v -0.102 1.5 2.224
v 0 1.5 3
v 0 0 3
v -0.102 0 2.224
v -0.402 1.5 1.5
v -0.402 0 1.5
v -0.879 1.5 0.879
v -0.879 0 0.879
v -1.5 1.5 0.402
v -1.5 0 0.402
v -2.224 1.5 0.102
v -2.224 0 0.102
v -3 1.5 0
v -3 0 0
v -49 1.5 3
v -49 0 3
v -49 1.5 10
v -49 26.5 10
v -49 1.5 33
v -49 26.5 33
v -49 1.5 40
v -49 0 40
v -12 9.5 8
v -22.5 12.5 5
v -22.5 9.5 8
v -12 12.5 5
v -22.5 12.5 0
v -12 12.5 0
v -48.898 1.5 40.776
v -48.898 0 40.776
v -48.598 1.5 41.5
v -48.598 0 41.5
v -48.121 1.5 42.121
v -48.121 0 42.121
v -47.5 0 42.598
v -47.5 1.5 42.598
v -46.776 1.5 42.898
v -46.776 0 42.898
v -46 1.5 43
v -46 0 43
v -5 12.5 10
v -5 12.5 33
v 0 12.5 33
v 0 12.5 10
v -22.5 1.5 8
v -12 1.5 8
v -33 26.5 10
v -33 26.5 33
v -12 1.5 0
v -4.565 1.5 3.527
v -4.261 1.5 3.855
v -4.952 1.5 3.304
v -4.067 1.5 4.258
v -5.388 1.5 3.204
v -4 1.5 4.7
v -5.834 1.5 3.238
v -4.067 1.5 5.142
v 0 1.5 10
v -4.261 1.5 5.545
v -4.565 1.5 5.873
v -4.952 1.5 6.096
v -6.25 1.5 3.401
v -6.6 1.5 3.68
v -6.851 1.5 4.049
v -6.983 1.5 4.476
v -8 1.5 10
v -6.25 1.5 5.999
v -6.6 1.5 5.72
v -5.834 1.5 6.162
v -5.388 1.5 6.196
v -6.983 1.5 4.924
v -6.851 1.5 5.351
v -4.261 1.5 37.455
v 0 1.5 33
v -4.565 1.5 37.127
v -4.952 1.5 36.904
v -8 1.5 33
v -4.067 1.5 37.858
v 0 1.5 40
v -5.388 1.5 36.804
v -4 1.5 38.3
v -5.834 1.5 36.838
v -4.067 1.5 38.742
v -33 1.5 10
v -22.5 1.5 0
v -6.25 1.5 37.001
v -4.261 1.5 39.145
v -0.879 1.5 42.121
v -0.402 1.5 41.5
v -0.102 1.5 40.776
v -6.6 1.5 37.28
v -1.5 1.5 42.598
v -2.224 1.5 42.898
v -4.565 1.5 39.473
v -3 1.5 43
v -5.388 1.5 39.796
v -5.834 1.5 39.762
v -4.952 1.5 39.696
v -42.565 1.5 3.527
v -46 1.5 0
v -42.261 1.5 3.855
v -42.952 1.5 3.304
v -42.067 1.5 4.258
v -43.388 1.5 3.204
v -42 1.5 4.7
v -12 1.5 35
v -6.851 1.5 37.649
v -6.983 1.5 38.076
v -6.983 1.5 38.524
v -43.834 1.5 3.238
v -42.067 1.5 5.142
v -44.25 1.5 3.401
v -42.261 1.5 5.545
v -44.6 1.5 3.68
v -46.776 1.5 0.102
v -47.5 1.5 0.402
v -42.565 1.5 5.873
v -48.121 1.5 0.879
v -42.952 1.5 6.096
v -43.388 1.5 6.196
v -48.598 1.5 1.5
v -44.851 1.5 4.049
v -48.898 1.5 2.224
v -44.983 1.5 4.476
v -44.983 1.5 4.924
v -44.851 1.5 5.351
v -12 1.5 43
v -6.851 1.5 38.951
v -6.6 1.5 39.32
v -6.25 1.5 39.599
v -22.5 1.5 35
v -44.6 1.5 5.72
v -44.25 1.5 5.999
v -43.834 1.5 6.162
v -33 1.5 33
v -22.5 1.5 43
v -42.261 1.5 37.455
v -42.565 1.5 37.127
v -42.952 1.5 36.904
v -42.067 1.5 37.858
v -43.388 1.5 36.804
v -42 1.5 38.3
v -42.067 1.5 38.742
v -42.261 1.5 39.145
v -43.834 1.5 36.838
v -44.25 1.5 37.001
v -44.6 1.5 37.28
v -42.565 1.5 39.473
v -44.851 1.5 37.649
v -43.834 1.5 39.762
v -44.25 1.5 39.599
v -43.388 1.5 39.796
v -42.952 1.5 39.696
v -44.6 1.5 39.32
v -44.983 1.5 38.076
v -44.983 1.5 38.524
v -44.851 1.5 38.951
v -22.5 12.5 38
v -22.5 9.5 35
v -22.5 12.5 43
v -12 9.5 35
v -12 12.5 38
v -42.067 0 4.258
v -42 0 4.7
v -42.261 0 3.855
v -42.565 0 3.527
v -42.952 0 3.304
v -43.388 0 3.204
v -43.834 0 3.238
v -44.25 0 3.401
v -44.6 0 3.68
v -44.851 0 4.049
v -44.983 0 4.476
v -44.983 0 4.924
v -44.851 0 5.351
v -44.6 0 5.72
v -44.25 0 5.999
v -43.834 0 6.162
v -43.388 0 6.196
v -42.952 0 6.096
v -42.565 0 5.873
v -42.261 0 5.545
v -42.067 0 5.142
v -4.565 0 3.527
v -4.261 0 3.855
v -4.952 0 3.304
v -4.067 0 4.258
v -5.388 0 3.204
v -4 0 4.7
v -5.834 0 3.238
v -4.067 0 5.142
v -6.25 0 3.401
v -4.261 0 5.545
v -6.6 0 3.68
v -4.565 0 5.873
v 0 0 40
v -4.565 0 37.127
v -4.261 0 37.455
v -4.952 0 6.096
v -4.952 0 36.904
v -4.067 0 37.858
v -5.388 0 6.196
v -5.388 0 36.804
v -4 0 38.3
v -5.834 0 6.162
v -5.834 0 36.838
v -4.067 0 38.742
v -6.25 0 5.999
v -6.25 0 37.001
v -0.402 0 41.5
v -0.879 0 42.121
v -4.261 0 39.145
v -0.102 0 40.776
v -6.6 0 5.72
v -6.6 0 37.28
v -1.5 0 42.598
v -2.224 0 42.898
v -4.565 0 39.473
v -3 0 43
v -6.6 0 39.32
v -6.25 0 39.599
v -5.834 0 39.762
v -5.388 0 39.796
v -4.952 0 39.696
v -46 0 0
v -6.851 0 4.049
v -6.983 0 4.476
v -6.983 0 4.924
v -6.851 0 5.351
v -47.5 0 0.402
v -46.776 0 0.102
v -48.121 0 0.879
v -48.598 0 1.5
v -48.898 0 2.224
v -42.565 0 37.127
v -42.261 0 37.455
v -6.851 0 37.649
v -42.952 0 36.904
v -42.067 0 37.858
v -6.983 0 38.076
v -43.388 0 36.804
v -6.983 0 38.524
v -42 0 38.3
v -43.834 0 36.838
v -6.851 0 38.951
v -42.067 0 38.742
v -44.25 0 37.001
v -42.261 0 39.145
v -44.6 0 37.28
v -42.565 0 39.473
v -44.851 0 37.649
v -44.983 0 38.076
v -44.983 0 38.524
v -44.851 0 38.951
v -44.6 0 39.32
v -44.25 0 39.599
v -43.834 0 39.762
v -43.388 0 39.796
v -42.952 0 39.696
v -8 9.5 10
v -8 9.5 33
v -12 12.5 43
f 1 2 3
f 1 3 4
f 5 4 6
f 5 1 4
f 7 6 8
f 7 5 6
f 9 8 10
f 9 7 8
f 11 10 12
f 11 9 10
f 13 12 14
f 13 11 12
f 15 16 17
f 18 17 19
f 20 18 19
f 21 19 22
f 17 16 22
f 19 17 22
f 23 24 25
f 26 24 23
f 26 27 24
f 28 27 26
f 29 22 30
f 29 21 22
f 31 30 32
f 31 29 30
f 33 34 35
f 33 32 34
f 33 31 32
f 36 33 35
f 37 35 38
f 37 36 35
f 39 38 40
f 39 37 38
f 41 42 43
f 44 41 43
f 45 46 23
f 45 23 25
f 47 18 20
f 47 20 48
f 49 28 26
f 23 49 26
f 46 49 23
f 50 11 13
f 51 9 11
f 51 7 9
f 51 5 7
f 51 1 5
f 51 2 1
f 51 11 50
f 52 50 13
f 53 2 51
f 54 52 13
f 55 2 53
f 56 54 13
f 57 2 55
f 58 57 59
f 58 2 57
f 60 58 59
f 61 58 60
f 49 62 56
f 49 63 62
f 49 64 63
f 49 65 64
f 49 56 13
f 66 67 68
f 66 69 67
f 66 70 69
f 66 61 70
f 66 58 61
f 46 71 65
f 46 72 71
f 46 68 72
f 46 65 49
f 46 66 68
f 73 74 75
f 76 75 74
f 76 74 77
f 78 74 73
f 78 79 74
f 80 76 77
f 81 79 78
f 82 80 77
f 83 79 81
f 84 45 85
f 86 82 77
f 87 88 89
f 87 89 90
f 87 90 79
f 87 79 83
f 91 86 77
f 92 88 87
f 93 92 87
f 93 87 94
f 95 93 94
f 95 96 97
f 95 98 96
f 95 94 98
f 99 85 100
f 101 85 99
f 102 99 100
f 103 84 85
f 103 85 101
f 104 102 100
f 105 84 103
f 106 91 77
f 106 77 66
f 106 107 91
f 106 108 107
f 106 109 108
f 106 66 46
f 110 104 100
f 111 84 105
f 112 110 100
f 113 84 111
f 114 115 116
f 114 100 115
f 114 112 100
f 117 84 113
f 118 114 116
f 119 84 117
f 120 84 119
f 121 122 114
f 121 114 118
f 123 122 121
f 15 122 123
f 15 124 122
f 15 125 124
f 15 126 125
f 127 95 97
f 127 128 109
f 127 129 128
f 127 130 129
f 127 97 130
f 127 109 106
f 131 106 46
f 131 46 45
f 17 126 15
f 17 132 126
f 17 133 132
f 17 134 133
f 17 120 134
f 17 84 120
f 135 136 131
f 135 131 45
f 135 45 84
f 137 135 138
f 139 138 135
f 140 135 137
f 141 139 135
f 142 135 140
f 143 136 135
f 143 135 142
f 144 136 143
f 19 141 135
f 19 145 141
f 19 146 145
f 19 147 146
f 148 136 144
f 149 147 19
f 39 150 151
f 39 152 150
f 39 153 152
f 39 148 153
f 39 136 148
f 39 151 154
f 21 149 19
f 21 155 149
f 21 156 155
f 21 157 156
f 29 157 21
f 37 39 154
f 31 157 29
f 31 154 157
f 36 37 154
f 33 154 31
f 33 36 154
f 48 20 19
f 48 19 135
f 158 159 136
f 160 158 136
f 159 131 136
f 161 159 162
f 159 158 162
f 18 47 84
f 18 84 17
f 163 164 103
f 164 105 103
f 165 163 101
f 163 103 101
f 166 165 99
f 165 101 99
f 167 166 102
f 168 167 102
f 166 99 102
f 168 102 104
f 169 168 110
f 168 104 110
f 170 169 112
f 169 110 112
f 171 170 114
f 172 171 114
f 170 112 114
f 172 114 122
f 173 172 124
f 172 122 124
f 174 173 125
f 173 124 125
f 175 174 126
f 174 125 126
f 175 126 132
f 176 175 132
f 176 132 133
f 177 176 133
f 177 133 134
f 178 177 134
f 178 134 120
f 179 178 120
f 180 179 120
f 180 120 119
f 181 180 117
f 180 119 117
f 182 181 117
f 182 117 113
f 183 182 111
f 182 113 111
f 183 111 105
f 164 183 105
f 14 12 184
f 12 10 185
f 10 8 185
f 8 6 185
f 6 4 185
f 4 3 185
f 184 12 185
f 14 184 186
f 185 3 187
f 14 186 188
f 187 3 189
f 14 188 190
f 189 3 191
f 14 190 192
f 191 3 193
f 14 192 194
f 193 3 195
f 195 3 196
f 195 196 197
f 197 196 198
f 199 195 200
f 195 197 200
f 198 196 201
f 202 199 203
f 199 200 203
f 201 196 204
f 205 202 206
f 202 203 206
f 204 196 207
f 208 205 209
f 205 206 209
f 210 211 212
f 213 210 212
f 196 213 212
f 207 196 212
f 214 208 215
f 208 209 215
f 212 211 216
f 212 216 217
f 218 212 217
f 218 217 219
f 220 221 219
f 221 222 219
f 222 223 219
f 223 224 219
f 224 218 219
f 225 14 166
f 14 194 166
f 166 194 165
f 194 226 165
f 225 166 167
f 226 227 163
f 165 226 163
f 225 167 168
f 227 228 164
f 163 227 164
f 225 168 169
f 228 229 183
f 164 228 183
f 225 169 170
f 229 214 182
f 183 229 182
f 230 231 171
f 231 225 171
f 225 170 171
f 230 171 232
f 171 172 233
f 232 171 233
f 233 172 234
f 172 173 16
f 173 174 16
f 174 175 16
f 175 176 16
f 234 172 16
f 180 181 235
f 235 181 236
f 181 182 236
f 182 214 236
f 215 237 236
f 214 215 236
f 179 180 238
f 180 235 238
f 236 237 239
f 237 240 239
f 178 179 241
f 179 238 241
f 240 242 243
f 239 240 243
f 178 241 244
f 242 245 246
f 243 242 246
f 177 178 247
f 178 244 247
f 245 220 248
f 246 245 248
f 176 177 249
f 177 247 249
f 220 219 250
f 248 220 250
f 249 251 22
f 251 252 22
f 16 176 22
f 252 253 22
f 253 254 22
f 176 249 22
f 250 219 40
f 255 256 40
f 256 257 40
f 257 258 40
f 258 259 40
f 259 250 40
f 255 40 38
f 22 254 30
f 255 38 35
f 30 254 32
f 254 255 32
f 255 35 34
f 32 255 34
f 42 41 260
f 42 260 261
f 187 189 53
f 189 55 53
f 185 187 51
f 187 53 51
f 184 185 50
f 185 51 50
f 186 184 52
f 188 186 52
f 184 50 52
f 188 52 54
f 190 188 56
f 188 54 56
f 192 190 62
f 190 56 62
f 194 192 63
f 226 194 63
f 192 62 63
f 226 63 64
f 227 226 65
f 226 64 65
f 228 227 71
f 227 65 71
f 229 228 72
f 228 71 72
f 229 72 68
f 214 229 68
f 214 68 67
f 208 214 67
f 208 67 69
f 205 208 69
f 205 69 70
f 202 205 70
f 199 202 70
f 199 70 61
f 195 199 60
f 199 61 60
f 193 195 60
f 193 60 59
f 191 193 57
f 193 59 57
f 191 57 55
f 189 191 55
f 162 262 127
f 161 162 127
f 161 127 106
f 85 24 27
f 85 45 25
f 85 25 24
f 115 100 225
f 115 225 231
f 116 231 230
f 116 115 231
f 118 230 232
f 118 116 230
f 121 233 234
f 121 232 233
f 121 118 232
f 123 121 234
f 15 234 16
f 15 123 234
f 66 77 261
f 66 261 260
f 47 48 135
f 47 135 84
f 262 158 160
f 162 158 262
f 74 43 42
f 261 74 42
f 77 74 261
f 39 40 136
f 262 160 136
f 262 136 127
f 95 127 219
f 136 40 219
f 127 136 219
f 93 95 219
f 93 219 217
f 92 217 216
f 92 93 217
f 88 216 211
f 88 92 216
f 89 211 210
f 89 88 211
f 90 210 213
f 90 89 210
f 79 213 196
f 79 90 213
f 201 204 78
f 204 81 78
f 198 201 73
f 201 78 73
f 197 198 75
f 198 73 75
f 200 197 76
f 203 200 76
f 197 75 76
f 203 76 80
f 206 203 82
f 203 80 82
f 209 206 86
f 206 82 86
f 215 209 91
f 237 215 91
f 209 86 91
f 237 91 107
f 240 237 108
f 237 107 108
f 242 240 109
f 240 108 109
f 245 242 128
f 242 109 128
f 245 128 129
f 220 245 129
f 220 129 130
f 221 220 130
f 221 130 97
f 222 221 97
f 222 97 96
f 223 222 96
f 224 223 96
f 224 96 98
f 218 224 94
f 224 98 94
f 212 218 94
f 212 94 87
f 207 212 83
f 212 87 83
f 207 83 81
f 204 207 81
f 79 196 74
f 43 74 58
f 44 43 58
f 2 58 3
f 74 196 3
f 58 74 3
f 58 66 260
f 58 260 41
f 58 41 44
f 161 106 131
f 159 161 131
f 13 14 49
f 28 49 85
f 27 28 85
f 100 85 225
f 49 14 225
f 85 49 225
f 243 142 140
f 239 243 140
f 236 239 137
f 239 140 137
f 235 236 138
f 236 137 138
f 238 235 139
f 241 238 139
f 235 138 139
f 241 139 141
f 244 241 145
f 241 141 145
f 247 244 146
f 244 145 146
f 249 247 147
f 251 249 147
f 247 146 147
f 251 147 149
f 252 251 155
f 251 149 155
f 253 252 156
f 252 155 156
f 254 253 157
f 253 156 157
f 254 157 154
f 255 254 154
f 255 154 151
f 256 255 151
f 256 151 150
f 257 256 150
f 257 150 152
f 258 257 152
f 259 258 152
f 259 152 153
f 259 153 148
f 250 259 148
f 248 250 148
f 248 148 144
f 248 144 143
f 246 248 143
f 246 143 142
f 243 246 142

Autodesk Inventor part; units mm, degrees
ref_plane "YZ Plane" through (0, 0, 0) normal (1, 0, 0) x (0, 1, 0)
ref_plane "XZ Plane" through (0, 0, 0) normal (0, 1, 0) x (-1, 0, 0)
ref_plane "XY Plane" through (0, 0, 0) normal (0, 0, 1) x (1, 0, 0)
sketch "Эскиз1" plane through (0, 0, 0) normal (0, 1, 0) x (-1, 0, 0)
  line L0 (0, 0) -> (49, 0)
  line L1 (49, 0) -> (49, 43)
  line L2 (49, 43) -> (0, 43)
  line L3 (0, 43) -> (0, 0)
  dimension "d0" = 49
  dimension "d1" = 43
extrude "Выдавливание1" add sketch "Эскиз1" along normal blind 1.5
sketch "Эскиз2" plane through (0, 1.5, 0) normal (0, 1, 0) x (1, 0, 0)
  circle A0 centre (-43.5, -4.7) radius 1.5
  circle A1 centre (-43.5, -38.3) radius 1.5
  circle A2 centre (-5.5, -4.7) radius 1.5
  circle A3 centre (-5.5, -38.3) radius 1.5
  line L0 (-49, 0) -> (-49, -43) projected
  line L1 (0, 0) -> (-49, 0) projected
  line L2 (-49, -43) -> (0, -43) projected
  line L3 (0, -43) -> (0, 0) projected
  dimension "d4" = 3
  dimension "d5" = 3
  dimension "d6" = 3
  dimension "d7" = 3
  dimension "d8" = 5.5
  dimension "d9" = 5.5
  dimension "d10" = 4.7
  dimension "d11" = 4.7
  dimension "d12" = 5.5
  dimension "d13" = 5.5
  dimension "d14" = 4.7
  dimension "d15" = 4.7
extrude "Выдавливание2" cut sketch "Эскиз2" against normal blind 1.5 contours A0 | A1 | A2 | A3
sketch "Эскиз3" plane through (0, 1.5, 0) normal (0, 1, 0) x (1, 0, 0)
  line L0 (0, 0) -> (-49, 0) projected
  line L1 (-22.5, 0) -> (-12, 0)
  line L2 (-12, 0) -> (-12, -8)
  line L3 (-12, -8) -> (-22.5, -8)
  line L4 (-22.5, -8) -> (-22.5, 0)
  line L5 (0, -43) -> (0, 0) projected
  line L6 (-49, -43) -> (0, -43) projected
  line L7 (-22.5, -43) -> (-12, -43)
  line L8 (-12, -43) -> (-12, -35)
  line L9 (-12, -35) -> (-22.5, -35)
  line L10 (-22.5, -35) -> (-22.5, -43)
  line L11 (0, -33) -> (-8, -33)
  line L12 (-8, -33) -> (-8, -10)
  line L13 (-8, -10) -> (0, -10)
  line L14 (0, -10) -> (0, -33)
  point P0 (0, -10)
  dimension "d18" = 10.5
  dimension "d19" = 8
  dimension "d20" = 12
  dimension "d21" = 8
  dimension "d22" = 8
  dimension "d23" = 10
  dimension "d24" = 10
extrude "Выдавливание3" add sketch "Эскиз3" along normal blind 11
chamfer "Фаска1" distance 3 angle 45 3 edges at (-17.25, 12.5, 8) (-17.25, 12.5, 35) (-8, 12.5, 21.5)
fillet "Сопряжение1" radius 3 4 edges at (0, 0.75, 0) (0, 0.75, 43) (-49, 0.75, 43) (-49, 0.75, 0)
sketch "Эскиз4" plane through (0, 1.5, 0) normal (0, 1, 0) x (1, 0, 0)
  line L0 (-49, -3) -> (-49, -40) projected
  line L1 (-49, -33) -> (-33, -33)
  line L2 (-33, -33) -> (-33, -10)
  line L3 (-33, -10) -> (-49, -10)
  line L4 (-49, -10) -> (-49, -33)
  line L5 (-22.5, 0) -> (-46, 0) projected
  line L6 (-46, -43) -> (-22.5, -43) projected
  point P0 (0, 0)
  dimension "d31" = 23
  dimension "d32" = 16
  dimension "d33" = 43
  dimension "d34" = 10
extrude "Выдавливание4" add sketch "Эскиз4" along normal blind 25
equation "\"d9\" = d8"
equation "\"d11\" = d10"
equation "\"d12\" = d8"
equation "\"d13\" = d12"
equation "\"d14\" = d11"
equation "\"d15\" = d11"
equation "\"d21\" = d19"
properties part number "драйвер"
